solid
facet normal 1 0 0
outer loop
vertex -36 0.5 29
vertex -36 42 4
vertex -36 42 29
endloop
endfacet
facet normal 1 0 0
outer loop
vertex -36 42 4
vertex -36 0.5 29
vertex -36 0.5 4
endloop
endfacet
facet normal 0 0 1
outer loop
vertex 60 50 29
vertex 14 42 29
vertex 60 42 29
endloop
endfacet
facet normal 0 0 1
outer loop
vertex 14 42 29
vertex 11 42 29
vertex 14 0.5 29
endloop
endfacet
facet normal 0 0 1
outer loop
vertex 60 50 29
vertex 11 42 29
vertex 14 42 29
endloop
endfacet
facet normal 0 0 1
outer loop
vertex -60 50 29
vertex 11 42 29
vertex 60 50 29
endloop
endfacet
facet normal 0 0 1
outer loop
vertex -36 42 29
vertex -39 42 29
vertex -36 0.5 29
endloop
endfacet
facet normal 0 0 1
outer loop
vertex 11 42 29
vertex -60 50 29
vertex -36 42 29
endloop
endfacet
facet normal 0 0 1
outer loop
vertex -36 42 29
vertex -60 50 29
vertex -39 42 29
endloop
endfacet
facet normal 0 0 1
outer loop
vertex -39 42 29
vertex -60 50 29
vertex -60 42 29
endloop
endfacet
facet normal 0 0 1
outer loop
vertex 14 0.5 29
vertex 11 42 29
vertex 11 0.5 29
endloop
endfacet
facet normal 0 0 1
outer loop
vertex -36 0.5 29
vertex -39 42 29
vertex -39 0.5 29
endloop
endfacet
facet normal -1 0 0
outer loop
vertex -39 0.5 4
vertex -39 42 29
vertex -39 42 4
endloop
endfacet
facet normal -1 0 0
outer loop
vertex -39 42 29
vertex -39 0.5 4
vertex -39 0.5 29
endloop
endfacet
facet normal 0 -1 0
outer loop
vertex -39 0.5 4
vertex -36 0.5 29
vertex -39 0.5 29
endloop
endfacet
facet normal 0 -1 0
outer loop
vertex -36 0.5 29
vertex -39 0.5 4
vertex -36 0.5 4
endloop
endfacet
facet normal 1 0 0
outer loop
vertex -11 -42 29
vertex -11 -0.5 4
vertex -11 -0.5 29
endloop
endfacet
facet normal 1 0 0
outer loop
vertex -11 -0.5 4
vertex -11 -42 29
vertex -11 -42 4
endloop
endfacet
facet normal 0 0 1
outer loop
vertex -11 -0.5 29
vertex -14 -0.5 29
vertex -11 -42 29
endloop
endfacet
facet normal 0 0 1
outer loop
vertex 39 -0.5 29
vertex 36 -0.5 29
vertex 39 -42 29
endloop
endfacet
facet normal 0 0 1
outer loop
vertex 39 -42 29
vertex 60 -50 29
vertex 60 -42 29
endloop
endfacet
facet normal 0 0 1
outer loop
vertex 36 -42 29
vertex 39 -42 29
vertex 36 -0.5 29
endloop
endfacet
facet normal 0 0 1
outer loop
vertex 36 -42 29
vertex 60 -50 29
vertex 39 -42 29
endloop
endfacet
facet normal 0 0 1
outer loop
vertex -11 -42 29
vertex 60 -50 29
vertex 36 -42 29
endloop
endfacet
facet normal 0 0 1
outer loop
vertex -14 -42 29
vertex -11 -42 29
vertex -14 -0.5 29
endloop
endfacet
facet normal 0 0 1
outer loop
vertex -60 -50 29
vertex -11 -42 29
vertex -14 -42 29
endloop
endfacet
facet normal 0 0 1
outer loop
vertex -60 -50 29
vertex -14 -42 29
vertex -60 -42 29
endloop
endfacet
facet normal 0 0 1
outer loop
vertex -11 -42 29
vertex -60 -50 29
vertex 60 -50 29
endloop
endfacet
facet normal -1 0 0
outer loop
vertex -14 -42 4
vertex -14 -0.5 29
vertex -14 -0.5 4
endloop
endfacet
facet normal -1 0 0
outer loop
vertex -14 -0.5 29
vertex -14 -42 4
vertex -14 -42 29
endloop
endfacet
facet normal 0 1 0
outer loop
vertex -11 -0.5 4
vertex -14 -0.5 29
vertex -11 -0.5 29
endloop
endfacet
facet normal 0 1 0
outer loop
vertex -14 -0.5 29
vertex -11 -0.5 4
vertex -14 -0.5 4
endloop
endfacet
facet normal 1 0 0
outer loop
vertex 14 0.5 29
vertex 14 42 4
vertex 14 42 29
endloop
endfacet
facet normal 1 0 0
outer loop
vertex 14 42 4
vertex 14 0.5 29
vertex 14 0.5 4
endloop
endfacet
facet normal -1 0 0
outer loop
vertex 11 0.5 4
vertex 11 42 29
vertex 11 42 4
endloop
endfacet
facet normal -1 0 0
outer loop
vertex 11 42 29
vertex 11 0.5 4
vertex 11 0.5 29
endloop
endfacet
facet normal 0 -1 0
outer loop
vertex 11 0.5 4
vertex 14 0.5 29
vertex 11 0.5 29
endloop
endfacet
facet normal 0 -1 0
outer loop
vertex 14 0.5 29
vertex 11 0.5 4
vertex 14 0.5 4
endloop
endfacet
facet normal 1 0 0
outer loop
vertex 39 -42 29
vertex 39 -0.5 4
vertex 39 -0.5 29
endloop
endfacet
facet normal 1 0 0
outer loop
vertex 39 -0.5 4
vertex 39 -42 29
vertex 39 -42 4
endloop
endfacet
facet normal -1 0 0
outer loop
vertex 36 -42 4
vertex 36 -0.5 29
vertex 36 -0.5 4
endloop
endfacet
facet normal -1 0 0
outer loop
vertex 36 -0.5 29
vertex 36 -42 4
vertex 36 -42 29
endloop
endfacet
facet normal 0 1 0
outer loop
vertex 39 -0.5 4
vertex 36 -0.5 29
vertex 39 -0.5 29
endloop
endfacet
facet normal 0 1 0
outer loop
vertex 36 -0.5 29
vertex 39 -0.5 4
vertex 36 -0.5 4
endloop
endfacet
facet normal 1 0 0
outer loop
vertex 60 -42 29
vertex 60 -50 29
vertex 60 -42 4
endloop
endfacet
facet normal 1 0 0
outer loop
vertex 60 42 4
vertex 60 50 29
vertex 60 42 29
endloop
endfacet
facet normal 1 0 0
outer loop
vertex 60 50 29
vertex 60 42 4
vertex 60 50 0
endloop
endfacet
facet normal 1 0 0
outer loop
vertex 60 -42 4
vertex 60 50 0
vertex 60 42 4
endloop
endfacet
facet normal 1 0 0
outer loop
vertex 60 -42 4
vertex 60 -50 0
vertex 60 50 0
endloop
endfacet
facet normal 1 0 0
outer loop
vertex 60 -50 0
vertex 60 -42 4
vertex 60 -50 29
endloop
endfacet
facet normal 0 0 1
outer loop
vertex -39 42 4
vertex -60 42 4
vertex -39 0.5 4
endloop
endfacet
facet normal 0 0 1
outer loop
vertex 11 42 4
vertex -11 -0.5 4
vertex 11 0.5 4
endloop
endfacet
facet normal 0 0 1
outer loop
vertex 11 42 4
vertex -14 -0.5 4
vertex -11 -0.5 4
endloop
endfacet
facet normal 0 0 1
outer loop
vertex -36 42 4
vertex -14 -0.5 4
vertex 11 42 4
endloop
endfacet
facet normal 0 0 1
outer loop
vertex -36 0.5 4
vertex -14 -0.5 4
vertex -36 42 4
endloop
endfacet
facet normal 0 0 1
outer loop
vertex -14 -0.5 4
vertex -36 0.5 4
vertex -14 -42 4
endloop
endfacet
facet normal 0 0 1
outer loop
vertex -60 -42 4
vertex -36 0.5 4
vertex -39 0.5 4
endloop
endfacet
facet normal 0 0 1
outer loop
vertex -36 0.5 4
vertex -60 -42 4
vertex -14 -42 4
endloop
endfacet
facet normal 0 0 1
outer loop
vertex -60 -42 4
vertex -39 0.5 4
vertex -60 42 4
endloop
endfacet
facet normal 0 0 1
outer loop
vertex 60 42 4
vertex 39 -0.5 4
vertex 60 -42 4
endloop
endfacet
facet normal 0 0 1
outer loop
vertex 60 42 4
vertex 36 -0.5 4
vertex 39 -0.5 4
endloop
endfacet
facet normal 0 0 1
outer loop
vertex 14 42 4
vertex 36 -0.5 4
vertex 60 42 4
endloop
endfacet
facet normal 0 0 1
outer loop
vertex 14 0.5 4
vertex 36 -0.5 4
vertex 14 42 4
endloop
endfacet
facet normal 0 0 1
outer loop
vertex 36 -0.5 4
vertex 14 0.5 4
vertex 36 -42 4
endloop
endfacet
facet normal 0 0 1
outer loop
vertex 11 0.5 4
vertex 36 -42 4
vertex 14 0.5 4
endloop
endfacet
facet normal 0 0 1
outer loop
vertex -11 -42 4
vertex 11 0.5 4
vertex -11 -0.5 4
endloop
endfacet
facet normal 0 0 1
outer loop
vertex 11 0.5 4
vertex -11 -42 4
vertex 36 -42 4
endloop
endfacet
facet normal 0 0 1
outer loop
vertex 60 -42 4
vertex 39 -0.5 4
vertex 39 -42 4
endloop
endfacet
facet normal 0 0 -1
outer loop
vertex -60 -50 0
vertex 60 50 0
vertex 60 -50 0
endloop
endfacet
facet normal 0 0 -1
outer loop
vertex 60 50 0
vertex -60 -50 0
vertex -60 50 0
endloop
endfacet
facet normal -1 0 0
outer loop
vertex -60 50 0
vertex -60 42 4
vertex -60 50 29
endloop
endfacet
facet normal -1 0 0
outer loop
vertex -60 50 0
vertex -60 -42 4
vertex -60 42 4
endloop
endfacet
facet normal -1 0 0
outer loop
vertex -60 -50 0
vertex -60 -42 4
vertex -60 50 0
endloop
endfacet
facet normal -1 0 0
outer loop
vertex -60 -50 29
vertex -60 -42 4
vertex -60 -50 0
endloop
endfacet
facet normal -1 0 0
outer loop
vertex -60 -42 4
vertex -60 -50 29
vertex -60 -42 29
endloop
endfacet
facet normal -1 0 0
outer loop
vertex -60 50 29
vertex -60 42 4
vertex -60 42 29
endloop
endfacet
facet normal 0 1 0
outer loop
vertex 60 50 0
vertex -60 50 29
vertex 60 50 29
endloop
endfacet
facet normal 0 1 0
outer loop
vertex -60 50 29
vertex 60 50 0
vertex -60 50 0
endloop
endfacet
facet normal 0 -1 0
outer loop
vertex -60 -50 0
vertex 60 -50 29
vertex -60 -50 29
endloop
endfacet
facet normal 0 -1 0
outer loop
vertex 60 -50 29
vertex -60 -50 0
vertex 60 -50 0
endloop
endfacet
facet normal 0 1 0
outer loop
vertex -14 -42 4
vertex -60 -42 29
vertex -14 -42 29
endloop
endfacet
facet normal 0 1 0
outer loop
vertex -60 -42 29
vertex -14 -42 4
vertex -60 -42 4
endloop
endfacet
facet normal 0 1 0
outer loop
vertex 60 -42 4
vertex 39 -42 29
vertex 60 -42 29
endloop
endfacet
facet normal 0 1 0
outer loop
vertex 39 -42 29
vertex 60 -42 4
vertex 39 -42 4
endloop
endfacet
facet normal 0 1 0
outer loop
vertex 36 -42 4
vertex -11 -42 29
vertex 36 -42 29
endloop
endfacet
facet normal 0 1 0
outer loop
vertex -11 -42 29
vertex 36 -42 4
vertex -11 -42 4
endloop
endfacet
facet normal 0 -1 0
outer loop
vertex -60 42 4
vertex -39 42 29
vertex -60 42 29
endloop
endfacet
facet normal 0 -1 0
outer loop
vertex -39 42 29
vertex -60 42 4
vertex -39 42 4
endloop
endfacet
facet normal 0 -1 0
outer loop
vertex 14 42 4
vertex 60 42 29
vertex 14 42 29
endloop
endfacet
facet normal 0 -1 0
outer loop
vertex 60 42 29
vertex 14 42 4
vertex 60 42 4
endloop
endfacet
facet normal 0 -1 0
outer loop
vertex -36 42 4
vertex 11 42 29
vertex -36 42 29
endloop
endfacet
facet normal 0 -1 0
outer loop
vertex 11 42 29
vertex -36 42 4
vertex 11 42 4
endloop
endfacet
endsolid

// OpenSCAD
$fn = 32;

// ----------------------------------------------------------------------
// Rib frame 120 x 100 x 29
// 4 ribs at 25 mm pitch, staggered
// ----------------------------------------------------------------------

// --- parameters (mm) ---
frame = [120, 100, 4];  // base plate size (x, y, z)
rail_w = 8;             // side rail width
ribs = 4;               // number of ribs
rib_t = 3;              // rib thickness
rib_h = 25;             // rib height above the base plate
pitch = 25;             // pitch between rib centres

// --- derived feature positions (mm) ---
span = (ribs - 1) * pitch;          // = 75   distance between the outer ribs
origin_x = -span / 2;               // = -37.5   X of the first rib
rib_len = frame[1] / 2 - rail_w + 0.5;  // = 42.5   length of a staggered rib
rib_y = 0.5 + rib_len / 2;          // = 21.75   Y of a staggered rib centre
row_offset = 2 * rib_y;             // = 43.5   distance between the two rows
feature_centers = [
  [origin_x + 0 * pitch, rib_y],
  [origin_x + 1 * pitch, -rib_y],
  [origin_x + 2 * pitch, rib_y],
  [origin_x + 3 * pitch, -rib_y]
];   // rib centre line, drives the rib loop

// base plate, two side rails, then the ribs read straight off feature_centers
union() {
  translate([-frame[0] / 2, -frame[1] / 2, 0]) cube(frame);
  translate([-frame[0] / 2, -frame[1] / 2, 0]) cube([frame[0], rail_w, frame[2] + rib_h]);
  translate([-frame[0] / 2, frame[1] / 2 - rail_w, 0]) cube([frame[0], rail_w, frame[2] + rib_h]);
  for (centre = feature_centers)
    translate([centre[0] - rib_t / 2, centre[1] - rib_len / 2, frame[2] - 1])
      cube([rib_t, rib_len, rib_h + 1]);
}
